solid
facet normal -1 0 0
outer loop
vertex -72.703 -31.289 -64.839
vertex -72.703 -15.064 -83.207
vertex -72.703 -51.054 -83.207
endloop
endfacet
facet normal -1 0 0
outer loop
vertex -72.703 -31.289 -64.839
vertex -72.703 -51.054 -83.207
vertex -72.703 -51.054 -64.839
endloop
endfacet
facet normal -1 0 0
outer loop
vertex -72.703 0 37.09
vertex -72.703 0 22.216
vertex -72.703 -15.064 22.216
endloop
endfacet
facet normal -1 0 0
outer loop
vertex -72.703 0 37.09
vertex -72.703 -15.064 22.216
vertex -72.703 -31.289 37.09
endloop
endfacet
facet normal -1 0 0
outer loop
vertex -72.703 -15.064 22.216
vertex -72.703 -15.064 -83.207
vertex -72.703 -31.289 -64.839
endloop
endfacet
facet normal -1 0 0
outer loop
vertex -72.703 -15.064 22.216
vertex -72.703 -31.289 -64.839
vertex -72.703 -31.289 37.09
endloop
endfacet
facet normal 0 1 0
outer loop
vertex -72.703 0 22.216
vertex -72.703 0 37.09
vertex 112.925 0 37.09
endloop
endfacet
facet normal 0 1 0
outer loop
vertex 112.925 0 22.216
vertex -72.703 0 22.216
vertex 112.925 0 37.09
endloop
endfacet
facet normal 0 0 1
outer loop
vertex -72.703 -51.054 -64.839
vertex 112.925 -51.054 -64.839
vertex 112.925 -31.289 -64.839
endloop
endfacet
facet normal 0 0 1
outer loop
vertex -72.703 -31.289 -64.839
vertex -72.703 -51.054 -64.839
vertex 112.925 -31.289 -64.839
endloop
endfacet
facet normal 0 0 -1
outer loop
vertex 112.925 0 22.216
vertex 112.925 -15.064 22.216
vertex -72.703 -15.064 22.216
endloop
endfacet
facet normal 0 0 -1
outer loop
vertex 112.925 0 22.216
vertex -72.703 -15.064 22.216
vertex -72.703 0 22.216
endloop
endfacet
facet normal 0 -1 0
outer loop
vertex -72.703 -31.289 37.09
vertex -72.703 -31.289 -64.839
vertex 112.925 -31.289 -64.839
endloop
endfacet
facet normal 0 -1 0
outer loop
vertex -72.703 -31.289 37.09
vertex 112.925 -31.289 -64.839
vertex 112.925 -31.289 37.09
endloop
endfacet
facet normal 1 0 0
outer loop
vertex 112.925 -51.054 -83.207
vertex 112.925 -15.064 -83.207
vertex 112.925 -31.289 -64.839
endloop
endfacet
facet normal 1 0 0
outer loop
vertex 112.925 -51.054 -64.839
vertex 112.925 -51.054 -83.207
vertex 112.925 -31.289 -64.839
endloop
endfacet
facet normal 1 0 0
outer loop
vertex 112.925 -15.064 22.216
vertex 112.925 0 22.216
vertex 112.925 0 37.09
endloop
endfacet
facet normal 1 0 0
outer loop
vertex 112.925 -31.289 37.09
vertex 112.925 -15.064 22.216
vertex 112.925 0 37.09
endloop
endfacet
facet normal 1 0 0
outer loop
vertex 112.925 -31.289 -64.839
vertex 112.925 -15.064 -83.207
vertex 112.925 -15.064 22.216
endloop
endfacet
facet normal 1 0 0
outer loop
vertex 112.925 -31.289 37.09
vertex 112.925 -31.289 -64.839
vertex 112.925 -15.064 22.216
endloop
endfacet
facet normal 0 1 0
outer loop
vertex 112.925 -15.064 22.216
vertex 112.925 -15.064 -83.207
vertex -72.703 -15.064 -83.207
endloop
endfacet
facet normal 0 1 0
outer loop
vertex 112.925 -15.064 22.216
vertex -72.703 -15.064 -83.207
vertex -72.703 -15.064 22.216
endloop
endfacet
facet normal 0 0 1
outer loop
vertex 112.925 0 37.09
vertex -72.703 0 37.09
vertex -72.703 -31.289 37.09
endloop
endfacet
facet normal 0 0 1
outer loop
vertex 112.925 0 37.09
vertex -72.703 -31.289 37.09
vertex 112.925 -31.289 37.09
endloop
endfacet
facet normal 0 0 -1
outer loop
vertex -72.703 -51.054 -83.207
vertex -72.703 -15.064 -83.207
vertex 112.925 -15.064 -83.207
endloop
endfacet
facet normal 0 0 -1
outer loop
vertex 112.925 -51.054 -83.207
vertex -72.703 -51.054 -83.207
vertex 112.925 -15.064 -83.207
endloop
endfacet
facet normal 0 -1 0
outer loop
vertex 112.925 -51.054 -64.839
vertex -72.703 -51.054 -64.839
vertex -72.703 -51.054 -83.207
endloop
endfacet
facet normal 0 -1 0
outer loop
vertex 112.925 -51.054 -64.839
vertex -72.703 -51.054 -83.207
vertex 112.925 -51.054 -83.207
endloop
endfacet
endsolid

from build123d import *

# Parameters (mm, degrees)
F0_W     = 185.6282874942
F0_H     = 120.2967502177
F1_DEPTH = 51.054
F2_W     = 19.7645789781
F2_H     = 101.9291467965
F3_DEPTH = 220.218
F4_W     = 15.0644443929
F4_H     = 105.4227072746
F5_DEPTH = 191.262


with BuildPart() as f1:
    # F0 (on Front) → F1 (new body)
    with BuildSketch(Plane.XZ):
        with Locations((20.1111845672, -23.0586882681)):
            Rectangle(F0_W, F0_H)
    extrude(amount=F1_DEPTH)

    # F2 (on face) → F3 (cut)
    with BuildSketch(Plane.YZ.offset(112.9253283143)):
        with Locations((-41.171710511, -13.8748865575)):
            Rectangle(F2_W, F2_H)
    extrude(amount=-F3_DEPTH, mode=Mode.SUBTRACT)

    # F4 (on face) → F5 (cut)
    with BuildSketch(Plane.YZ.offset(112.9253283143)):
        with Locations((-7.5322221965, -30.4957097396)):
            Rectangle(F4_W, F4_H)
    extrude(amount=-F5_DEPTH, mode=Mode.SUBTRACT)


solid = f1.part
